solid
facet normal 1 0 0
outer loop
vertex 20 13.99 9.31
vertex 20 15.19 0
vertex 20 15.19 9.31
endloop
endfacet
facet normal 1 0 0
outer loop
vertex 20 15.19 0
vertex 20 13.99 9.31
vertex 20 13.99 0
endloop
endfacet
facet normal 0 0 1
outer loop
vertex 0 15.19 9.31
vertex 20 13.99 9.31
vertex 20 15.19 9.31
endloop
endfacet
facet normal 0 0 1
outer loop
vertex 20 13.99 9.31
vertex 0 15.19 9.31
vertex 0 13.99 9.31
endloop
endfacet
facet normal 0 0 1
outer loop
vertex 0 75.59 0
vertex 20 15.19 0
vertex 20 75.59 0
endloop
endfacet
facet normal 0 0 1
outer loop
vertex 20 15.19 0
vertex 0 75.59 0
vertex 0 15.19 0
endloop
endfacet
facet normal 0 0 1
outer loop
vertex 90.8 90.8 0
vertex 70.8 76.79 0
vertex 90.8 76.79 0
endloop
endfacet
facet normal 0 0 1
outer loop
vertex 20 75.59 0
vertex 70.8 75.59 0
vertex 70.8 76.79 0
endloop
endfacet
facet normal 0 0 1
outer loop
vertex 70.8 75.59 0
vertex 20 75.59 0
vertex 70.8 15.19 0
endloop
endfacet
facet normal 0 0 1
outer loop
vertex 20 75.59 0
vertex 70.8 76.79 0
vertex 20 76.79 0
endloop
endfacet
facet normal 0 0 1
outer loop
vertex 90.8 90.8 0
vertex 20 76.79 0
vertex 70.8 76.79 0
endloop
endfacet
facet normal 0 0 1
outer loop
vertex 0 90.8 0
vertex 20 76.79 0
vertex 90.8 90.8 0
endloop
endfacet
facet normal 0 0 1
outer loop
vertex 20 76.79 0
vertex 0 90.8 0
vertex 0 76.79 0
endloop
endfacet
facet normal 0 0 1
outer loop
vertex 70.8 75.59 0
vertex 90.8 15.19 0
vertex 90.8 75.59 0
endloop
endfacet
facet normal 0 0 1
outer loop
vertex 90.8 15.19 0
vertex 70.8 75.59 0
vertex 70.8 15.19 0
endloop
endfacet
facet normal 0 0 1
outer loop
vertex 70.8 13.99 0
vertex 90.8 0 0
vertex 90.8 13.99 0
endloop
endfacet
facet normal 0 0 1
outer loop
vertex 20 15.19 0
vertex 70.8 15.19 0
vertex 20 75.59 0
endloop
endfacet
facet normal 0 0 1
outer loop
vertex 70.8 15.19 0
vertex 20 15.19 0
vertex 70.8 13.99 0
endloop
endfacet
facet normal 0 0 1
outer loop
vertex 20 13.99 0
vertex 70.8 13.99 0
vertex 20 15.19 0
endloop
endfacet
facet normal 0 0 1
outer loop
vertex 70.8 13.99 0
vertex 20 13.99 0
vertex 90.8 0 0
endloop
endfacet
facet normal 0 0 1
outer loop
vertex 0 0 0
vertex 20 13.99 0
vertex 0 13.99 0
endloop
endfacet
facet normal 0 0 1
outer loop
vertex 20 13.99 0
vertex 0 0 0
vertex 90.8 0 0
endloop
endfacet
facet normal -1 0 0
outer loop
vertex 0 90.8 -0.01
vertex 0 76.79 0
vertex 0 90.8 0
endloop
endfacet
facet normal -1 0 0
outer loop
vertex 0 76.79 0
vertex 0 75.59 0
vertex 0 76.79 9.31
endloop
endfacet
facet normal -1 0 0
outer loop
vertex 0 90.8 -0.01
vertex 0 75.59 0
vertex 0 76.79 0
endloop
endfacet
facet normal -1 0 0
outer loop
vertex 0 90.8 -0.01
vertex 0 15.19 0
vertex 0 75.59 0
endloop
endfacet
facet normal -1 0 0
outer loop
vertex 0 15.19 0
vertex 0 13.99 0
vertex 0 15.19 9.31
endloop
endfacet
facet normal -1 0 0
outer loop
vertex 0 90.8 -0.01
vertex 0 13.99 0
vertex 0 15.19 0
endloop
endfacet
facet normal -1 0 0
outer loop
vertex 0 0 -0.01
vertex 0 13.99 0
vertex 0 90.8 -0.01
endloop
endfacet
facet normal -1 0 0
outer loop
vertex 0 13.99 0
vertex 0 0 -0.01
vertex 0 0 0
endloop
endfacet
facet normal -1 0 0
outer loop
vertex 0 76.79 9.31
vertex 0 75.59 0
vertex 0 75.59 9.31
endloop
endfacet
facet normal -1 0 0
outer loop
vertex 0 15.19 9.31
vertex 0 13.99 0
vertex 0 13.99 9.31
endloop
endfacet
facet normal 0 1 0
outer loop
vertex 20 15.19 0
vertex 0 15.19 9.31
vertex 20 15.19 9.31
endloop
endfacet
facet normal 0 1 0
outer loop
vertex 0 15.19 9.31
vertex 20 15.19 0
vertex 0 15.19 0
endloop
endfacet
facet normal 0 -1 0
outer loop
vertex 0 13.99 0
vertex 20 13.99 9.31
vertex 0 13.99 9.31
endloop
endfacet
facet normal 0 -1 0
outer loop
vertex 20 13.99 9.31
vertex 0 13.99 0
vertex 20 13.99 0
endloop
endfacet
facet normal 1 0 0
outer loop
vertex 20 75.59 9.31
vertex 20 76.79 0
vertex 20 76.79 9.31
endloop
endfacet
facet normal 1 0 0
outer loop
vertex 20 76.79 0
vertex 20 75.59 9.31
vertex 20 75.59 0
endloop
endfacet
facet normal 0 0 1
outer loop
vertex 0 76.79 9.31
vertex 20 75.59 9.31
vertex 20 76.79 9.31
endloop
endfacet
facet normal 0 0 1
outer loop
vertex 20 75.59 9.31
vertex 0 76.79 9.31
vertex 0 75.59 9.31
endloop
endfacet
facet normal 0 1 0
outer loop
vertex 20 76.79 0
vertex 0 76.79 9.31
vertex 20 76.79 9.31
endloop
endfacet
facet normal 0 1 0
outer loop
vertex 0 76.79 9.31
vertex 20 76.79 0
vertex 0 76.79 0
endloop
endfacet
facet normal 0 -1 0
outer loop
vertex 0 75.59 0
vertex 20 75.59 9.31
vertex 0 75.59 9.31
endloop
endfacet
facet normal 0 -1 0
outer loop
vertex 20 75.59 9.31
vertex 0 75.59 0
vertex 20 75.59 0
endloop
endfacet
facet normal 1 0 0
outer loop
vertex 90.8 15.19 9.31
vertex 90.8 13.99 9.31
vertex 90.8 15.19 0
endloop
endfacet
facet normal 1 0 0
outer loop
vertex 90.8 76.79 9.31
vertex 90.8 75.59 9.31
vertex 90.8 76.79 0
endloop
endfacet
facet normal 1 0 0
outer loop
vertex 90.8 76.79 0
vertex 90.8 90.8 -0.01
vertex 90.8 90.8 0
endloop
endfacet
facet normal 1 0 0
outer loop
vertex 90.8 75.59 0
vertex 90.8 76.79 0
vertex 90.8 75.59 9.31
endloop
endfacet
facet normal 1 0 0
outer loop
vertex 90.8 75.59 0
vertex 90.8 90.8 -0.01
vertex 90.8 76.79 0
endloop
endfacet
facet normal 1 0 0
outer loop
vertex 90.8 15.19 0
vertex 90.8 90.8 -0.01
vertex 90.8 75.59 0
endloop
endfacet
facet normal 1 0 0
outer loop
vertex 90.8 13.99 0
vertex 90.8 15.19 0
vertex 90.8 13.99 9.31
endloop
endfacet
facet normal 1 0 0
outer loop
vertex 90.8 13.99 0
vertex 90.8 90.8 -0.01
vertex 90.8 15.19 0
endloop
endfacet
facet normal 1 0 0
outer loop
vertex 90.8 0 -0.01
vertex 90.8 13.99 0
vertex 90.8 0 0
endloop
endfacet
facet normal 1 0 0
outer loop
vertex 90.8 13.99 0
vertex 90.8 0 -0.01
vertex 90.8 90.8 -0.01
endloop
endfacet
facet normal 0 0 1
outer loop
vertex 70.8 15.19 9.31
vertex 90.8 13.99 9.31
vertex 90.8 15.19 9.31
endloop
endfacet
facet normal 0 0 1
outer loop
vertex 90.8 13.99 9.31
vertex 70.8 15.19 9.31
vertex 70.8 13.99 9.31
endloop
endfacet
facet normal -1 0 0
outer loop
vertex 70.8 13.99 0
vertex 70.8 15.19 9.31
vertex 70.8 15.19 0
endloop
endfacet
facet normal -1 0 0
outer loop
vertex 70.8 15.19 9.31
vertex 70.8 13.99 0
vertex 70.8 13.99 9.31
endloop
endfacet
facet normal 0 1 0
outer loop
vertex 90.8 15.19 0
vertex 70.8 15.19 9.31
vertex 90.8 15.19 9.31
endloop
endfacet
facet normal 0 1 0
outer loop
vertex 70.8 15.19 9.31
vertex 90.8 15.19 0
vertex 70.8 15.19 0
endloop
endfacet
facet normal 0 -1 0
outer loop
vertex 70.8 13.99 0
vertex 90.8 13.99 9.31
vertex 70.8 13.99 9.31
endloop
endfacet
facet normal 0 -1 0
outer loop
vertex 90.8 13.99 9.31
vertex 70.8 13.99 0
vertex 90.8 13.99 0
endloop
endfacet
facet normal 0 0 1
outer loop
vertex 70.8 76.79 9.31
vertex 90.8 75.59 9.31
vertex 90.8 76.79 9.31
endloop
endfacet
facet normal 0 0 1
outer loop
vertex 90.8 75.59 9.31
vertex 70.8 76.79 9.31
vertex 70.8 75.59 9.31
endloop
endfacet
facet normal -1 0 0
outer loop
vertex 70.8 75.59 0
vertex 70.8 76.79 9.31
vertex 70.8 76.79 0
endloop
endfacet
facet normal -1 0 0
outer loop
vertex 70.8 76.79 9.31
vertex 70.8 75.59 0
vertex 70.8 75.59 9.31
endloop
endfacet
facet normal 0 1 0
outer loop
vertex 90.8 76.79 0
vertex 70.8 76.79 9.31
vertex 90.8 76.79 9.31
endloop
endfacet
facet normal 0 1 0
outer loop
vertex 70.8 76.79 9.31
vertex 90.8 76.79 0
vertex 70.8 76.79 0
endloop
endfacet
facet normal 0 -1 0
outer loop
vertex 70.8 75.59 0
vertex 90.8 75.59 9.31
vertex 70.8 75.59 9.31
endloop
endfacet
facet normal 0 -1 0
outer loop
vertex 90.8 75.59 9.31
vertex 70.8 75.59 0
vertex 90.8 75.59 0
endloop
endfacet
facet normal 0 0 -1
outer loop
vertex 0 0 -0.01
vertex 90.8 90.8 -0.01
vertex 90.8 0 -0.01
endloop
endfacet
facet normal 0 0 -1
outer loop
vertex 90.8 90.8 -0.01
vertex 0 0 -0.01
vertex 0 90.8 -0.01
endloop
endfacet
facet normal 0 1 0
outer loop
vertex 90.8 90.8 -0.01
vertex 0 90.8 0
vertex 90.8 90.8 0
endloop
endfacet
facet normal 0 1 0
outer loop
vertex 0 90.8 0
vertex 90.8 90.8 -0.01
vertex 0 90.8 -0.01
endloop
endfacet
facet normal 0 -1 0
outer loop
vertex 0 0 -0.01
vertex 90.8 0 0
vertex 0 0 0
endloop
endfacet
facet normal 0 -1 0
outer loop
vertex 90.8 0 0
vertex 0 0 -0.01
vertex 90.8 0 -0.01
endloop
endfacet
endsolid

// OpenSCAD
// file: ../Base/Boxes.scad
// Fischertechnik Box Foundation
// Pre-designed Boxes

use <Constants.scad>

include <PlacementOptions.scad>

box190Width = 190;
box190Depth = 130;
box130Width = 130;
box130Depth = 95;

// Values are from an original ec3 box
topBottomDifference = 1.5;
outerHeight = 40;
innerHeight = 38.2;
baseThickness = outerHeight - innerHeight;
stackExcess = 5.7;
radius = 3.5;
wallThickness = 1.5;
tolerance = 0.2;
stackOffset = innerHeight - stackExcess;

boxUsageHeight = stackOffset;
boxWallThickness = wallThickness;
boxBaseThickness = baseThickness;
boxWebWidth = 3.0;

// getBoxWallThickness()
// Gets the wall thickness of a Fischertechnik Box
function getBoxWallThickness() = boxWallThickness;

// getBoxUsageHeight()
// Gets the usable height of a Fischertechnik box
function getBoxUsageHeight() = boxUsageHeight;

// getBoxInnerHeight()
// Gets the inner height of a Fischertechnik box, including the stack excess
function getBoxInnerHeight() = innerHeight;

// getBoxBaseThickness()
// Gets the thickness of the Fischertechnik box base.
function getBoxBaseThickness() = boxBaseThickness;

// getBoxWebWidth()
// Gets the width of a box web
function getBoxWebWidth() = boxWebWidth;

// getBox190Space()
// Gets the usable inner space of a Box 190 as an x/y-list
function getBox190Space() = [
    box190Width - 2*getBoxWallThickness() - topBottomDifference, 
    box190Depth - 2*getBoxWallThickness() - topBottomDifference ];

// BoxBase(width, depth)
// Creates an empty stackable Fischertechnik compatible box
// width = Outer width of the box (190, 130, ...)
// depth = Outer depth of the box (130, 95, ...)

module BoxBase(width, depth, height=outerHeight) {    
    thinPlate = 0.01;

    innerHeight = height - baseThickness;    
    
    module BodyPlate(width, depth) {
        translate([radius, radius])
        hull() {
            w = width-2*radius;
            d = depth-2*radius;
            cube([w, d, thinPlate]);
            cylinder(thinPlate, r=radius, $fn=getFragments());
            translate([w, 0])
                cylinder(thinPlate, r=radius, $fn=getFragments());
            translate([w, d])
                cylinder(thinPlate, r=radius, $fn=getFragments());
            translate([0, d])
                cylinder(thinPlate, r=radius, $fn=getFragments());
        }
    }
    
    module Body(tolerance=tolerance) {
        hull() {
            // Bottom with tolerance to fit into the original boxes when stacked
            translate([-wallThickness+tolerance, -wallThickness+tolerance, -baseThickness])
                BodyPlate(width-topBottomDifference-2*tolerance, depth-topBottomDifference-2*tolerance);
            
            // Top
            translate([-wallThickness-topBottomDifference/2, -wallThickness-topBottomDifference/2, innerHeight-thinPlate])
                BodyPlate(width, depth);
         }
    }

    module Cutoff() {
        hull() {
            coWidth = width - 2*wallThickness;
            coDepth = depth - 2*wallThickness;
            
            // Bottom
            BodyPlate(coWidth-topBottomDifference, coDepth-topBottomDifference);

            // Top
            translate([-topBottomDifference/2, -topBottomDifference/2, innerHeight+thinPlate]) 
                BodyPlate(coWidth, coDepth);
        }
    }
    
    difference() {        
        Body();
        Cutoff();
        stackOffset = innerHeight - stackExcess;
        translate([0, 0, stackOffset + baseThickness])
            Body(tolerance=0);
    }
}

// Creates the Fischertechnik empty box 130x190 mm and places it at position 0,0
// 190x130 are the outer sizes, the inner space is slightly smaller. Use getBox190Space() to get the inner sizes.
// The box is positioned that the usable inner space is at the 0,0,0 position. The

module Box190() {
    BoxBase(box190Width, box190Depth);
}

// Gets the usable inner space of a Box 130 as an x/y-list
function getBox130Space() = [
    box130Width - 2*getBoxWallThickness(), 
    box130Depth - 2*getBoxWallThickness() ];

// Creates the Fischertechnik empty box 95x130 mm and places it at position 0,0
// 190x130 are the outer sizes, the inner space is slightly smaller. Use getBox190Space() to get the inner sizes.
// The box is positioned that the usable inner space is at the 0,0,0 position. The

module Box130() {
    BoxBase(box130Width, box130Depth);
}

// Creates a web at the specified box walls
// corner 0 = LowerLeft, 1 = UpperLeft, 2 = UpperRight, 3 = LowerRight
// side 0 = LeftOfCorner, 1 = RightOfCorner
// distance = Distance in mm from the corner
// boxSpace = inner width and depth of the box (default: Box 190)
// webWidth = length of the web (default is 3 mms)
// webThickness = thickness of the web (default is 1 mm)

module BoxWeb(corner, side, distance, boxSpace=getBox190Space(), webWidth=getBoxWebWidth(), webThickness=1.0) {
    sink = getBoxWallThickness()/2;

    width = (corner % 2 == 0) ? 
            (side == LeftOfCorner ? webWidth : webThickness) :
            (side == LeftOfCorner ? webThickness : webWidth);

    depth = (corner % 2 == 0) ? 
            (side == RightOfCorner ? webWidth : webThickness) :
            (side == RightOfCorner ? webThickness : webWidth);
    
    xDiff = corner == LowerLeft ? 
                (side == LeftOfCorner ? -sink : distance) :
            (corner == UpperLeft ?                
                (side == LeftOfCorner ? distance : -sink) :
            (corner == UpperRight ?
                (side == LeftOfCorner ? boxSpace.x-webWidth+sink : boxSpace.x-distance-webThickness) :
                (side == LeftOfCorner ? boxSpace.x-distance-webThickness: boxSpace.x-webWidth+sink)));

    yDiff = corner == LowerLeft ? 
                (side == RightOfCorner ? -sink : distance) :
            (corner == UpperLeft ?
                (side == RightOfCorner ? boxSpace.y-distance : boxSpace.y-webWidth+sink) :
            (corner == UpperRight ?
                (side == RightOfCorner ? boxSpace.y-webWidth+sink : boxSpace.y-distance) :
                (side == RightOfCorner ? distance : -sink)));
    
    translate([xDiff, yDiff, -getExcess()])
        cube([width, depth, boxUsageHeight + 2*getExcess()]);
}
// file: ../Base/Rotation.scad
// Fischertechnik Box Foundation
// Geometry Helpers Rotation

include <PlacementOptions.scad>

// getRotatedSpace(space, rotation=NoRotation)
// Rotates the space dependent on the specified rotation

function getRotatedSpace(space, rotation=NoRotation) = [
    (rotation == Rotate90 || rotation == Rotate270) ? space.y : space.x,
    (rotation == Rotate90 || rotation == Rotate270) ? space.x : space.y
];

// Rotates the given space around the fixed left lower corner
// space = the space the children needs as width/depth list [width,depth]
// rotation = 0 Rotate0 degrees, 1 Rotate90 degrees, 2 Rotate180 degrees, 3 Rotate270 degrees (equivalent to -90)

module RotateFix(space, rotation=NoRotation) {
    dy = (rotation == Rotate0 || rotation == Rotate270) ? 0 :
        (rotation == Rotate90) ? space.x :
        space.y;
    dx = (rotation < Rotate180) ? 0 :
        (rotation == Rotate180) ? space.x :
        space.y;
    
    translate([dx, dy, 0])
        rotate([0, 0, rotations[rotation]])
            children();
}
// file: ../Base/Alignment.scad
// Fischertechnik Box Foundation
// Geometry Helpers Alignment

include <PlacementOptions.scad>

// getAlignedX(elementWidth, spaceWidth, align=AlignRight, offset=0)
// Gets the aligned X offset of an element with the given
// width in the given space.
// elementWidth = The width of the element to positon
// spaceWidth = The space where the element should be aligned
// align = 0 AlignLeft, 1 AlignCenter, 2 AlignRight
// offset = an optional offset from the aligned position. When
// aligned left or centered, then positive values are in X direction.
// When aligned right then positive values are in negative X direction.

function getAlignedX(elementWidth, spaceWidth, align=AlignRight, offset=0) =
    (align == AlignLeft) ?
        offset :
        ((align == AlignCenter) ?
        (spaceWidth - elementWidth)/2 + offset :
        spaceWidth - offset - elementWidth);

// getAlignedY(elementDepth, spaceDepth, align=AlignTop, offset=0)
// Gets the aligned Y offset of an element with the given
// depth in the given space.
// elementDepth = The depth of the element to positon
// spaceDepth = The space where the element should be aligned
// align = 0 AlignBottom, 1 AlignCenter, 2 AlignTop
// offset = an optional offset from the aligned position. When
// aligned bottom or centered, then positive values are in Y direction.
// When aligned top then positive values are in negative Y direction.

function getAlignedY(elementDepth, spaceDepth, align=AlignTop, offset=0) =
    (align == AlignBottom) ?
        offset :
        ((align == AlignCenter) ?
        (spaceDepth - elementDepth)/2 + offset :
        spaceDepth - offset - elementDepth);
// file: ../Base/PlacementOptions.scad
// Fischertechnik Box Foundation
// Placement Options

// Alignment
NoAlign = 0;
AlignLeft = 1;
AlignBottom = 2;
AlignCenter = 3;
AlignRight = 4;
AlignTop = 5;

// Element rotation degree steps
rotations = [0, -90, -180, -270];

// Rotation
NoRotation = 0;
Rotate0 = 0;
Rotate90 = 1;
Rotate180 = 2;
Rotate270 = 3;

// Docking (seen from above)
NoDock = -1;
DockLeft = 0;
DockTop = 1;
DockRight = 2;
DockCorner = 2;
DockBottom = 3;

// Web corners
LowerLeft = 0;
UpperLeft = 1;
UpperRight = 2;
LowerRight = 3;

// Web position relative to corner
LeftOfCorner = 0;
RightOfCorner = 1;
// file: ../Base/Placement.scad
// Fischertechnik Box Foundation
// Geometry Helpers Placement

use <Constants.scad>
use <Alignment.scad>
use <Rotation.scad>
use <Boxes.scad>

include <PlacementOptions.scad>

// Place(x=0, y=0, elementSpace=[0,0], alignX=AlignLeft, alignY=AlignBottom, rotation=Rotate0, boxSpace=getBox190Space())
// Places the child at the specified position
// y = Y-Position. This is a relative position when an X aligment is specified.
// x = X-Position. This is a relative position when an Y aligment is specified.
// elementSpace = space of the element to be placed [x,y]
// alignX = -1=NoAlign, 0 AlignLeft, 1 AlignCenter, 3 AlignRight (elementSpace and boxSpace required!)
// alignY = -1=NoAlign, 2 AlignBottom, 1 AlignCenter, 4 AlignTop (elementSpace and boxSpace required!)
// rotation = 0 Rotate0 0 degrees, 1 Rotate90 90 degrees, 
// 2 Rotate180 180 degrees, 3 Rotate270 270 degrees (equivalent to -90)
// boxSpace = Inner space of the box where the placement occurs [x,y] - default is Box 190x130 inner space

module Place(x=0, y=0, elementSpace=[0,0], 
  alignX=AlignLeft, alignY=AlignBottom, 
  rotation=NoRotation, boxSpace=getBox190Space()) {

    module Position(x, y, space, rotation=Rotate0) {
        translate([x, y, 0])
            RotateFix(space, rotation)
                children();
    }

    space = getRotatedSpace(elementSpace, rotation);
    alignedX = getAlignedX(space.x, boxSpace.x, alignX, x);
    alignedY = getAlignedY(space.y, boxSpace.y, alignY, y);
    Position(alignedX, alignedY, elementSpace, rotation)
        children();
}

// Center(space=getBox130Space(), elementSpace=[0,0])
// space = Space where the children is centered. For cylinder use centered=true and no elementSpace.
// elementSpace = space of the element to be centered [x,y]

module Center(space=getBox190Space(), elementSpace=[0,0]) {
    Place(elementSpace=elementSpace, boxSpace=space, alignX=AlignCenter, alignY=AlignCenter)
        children();
}

// CenterHorizontal(width=0, y=0, offset=0, space=getBox130Space())
// width = Width of the element to be placed.
// y = Y position of the element
// offset = Offset from the center position (negative will be left of the center)
// space = Space where the element is placed

module CenterHorizontal(width=0, y=0, offset=0, space=getBox190Space()) {
    Place(x=offset, y=y, elementSpace=[width, 0], boxSpace=space, alignX=AlignCenter)
        children(0);
}

// CenterVertical(depth=0, x=0, offset=0, space=getBox130Space())
// depth = Depth of the element to be placed.
// x = X position of the element
// offset = Offset from the center position (negative will be down of the center)
// space = Space where the element is placed

module CenterVertical(depth=0, x=0, offset=0, space=getBox190Space()) {
    Place(x=x, y=offset, elementSpace=[0, depth], boxSpace=space, alignY=AlignCenter)
        children(0);
}

// getIsVertical(align)
// True if the specified alignment needs a vertical orientation for a divider (AlignRight, AlignLeft)

function getIsVertical(align) = (align == AlignRight || align == AlignLeft);

// getIsHorizontal(align)
// True if the specified alignment needs a horizontal orientation for a divider (AlignTop, AlignBottom)

function getIsHorizontal(align) = (align == AlignTop || align == AlignBottom);
// file: ../Base/Constants.scad
// Fischertechnik Box Foundation
// Constants

// Constant values necessary for multiple elements

// Base constants
dividerThickness = 1.2;
excess = 0.01;
fragments = 90;
tolerance = 0.8;

// Gets the thickness of a divider 
function getDividerThickness() = dividerThickness;

// Gets the excess that is used to merge walls into each other
function getExcess() = excess;

// Gets amount of fragments of a cylinder
function getFragments() = fragments;

// Gets the inner tolerance of a frame to each side
function getTolerance() = tolerance;


// Fischertechnik specific constants
axisDiameter = 4;
axisBottomDiameter = axisDiameter + 1;
standardEdgeDistance = 2.5;
standardWebDistance = 11.5;
standardCornerLength = 15;
tubeWallFactor = 0.8;
smallPartsFrameHeight = 20;

// Gets axis diameter
function getAxisDiameter() = axisDiameter;

// Gets axis bottom diameter for thicker part at the bottom
function getAxisBottomDiameter() = axisBottomDiameter;

// gets the standard distance to the wall of the box for dockable frames with webs
function getStandardEdgeDistance() = standardEdgeDistance;

// gets the standard distance of each web to the corner of the dockable frame
function getStandardWebDistance() = standardWebDistance;

// gets the standard length of the corner walls of a dockable frame
function getStandardCornerLength() = standardCornerLength;

// gets the wall thickness of a tube.
function getTubeWallThickness() = tubeWallFactor * getDividerThickness();

// gets the frame height for docked small parts boxes.
function getSmallPartsFrameHeight() = smallPartsFrameHeight;
// main file
// Fischertechnik Box Library
// Base Plate 90 x 90
// 31002

use <../ModelBase/Complex.scad>

width = 90;
depth = 90;

// getRailsBasePlate90x90Space()
// Gets the width and depth of the space the rails base for the base plate 90x90 needs.
function getRailsBasePlate90x90Space() = getRailsBasePlateVolume(width, depth);

// RailsBasePlate90x90()
// Rails for a base plate of 180 x 90 mm
// 31002

module RailsBasePlate90x90() {
    RailsBasePlate(width, depth);
}

// Test
color("lightgray")
RailsBasePlate90x90();
